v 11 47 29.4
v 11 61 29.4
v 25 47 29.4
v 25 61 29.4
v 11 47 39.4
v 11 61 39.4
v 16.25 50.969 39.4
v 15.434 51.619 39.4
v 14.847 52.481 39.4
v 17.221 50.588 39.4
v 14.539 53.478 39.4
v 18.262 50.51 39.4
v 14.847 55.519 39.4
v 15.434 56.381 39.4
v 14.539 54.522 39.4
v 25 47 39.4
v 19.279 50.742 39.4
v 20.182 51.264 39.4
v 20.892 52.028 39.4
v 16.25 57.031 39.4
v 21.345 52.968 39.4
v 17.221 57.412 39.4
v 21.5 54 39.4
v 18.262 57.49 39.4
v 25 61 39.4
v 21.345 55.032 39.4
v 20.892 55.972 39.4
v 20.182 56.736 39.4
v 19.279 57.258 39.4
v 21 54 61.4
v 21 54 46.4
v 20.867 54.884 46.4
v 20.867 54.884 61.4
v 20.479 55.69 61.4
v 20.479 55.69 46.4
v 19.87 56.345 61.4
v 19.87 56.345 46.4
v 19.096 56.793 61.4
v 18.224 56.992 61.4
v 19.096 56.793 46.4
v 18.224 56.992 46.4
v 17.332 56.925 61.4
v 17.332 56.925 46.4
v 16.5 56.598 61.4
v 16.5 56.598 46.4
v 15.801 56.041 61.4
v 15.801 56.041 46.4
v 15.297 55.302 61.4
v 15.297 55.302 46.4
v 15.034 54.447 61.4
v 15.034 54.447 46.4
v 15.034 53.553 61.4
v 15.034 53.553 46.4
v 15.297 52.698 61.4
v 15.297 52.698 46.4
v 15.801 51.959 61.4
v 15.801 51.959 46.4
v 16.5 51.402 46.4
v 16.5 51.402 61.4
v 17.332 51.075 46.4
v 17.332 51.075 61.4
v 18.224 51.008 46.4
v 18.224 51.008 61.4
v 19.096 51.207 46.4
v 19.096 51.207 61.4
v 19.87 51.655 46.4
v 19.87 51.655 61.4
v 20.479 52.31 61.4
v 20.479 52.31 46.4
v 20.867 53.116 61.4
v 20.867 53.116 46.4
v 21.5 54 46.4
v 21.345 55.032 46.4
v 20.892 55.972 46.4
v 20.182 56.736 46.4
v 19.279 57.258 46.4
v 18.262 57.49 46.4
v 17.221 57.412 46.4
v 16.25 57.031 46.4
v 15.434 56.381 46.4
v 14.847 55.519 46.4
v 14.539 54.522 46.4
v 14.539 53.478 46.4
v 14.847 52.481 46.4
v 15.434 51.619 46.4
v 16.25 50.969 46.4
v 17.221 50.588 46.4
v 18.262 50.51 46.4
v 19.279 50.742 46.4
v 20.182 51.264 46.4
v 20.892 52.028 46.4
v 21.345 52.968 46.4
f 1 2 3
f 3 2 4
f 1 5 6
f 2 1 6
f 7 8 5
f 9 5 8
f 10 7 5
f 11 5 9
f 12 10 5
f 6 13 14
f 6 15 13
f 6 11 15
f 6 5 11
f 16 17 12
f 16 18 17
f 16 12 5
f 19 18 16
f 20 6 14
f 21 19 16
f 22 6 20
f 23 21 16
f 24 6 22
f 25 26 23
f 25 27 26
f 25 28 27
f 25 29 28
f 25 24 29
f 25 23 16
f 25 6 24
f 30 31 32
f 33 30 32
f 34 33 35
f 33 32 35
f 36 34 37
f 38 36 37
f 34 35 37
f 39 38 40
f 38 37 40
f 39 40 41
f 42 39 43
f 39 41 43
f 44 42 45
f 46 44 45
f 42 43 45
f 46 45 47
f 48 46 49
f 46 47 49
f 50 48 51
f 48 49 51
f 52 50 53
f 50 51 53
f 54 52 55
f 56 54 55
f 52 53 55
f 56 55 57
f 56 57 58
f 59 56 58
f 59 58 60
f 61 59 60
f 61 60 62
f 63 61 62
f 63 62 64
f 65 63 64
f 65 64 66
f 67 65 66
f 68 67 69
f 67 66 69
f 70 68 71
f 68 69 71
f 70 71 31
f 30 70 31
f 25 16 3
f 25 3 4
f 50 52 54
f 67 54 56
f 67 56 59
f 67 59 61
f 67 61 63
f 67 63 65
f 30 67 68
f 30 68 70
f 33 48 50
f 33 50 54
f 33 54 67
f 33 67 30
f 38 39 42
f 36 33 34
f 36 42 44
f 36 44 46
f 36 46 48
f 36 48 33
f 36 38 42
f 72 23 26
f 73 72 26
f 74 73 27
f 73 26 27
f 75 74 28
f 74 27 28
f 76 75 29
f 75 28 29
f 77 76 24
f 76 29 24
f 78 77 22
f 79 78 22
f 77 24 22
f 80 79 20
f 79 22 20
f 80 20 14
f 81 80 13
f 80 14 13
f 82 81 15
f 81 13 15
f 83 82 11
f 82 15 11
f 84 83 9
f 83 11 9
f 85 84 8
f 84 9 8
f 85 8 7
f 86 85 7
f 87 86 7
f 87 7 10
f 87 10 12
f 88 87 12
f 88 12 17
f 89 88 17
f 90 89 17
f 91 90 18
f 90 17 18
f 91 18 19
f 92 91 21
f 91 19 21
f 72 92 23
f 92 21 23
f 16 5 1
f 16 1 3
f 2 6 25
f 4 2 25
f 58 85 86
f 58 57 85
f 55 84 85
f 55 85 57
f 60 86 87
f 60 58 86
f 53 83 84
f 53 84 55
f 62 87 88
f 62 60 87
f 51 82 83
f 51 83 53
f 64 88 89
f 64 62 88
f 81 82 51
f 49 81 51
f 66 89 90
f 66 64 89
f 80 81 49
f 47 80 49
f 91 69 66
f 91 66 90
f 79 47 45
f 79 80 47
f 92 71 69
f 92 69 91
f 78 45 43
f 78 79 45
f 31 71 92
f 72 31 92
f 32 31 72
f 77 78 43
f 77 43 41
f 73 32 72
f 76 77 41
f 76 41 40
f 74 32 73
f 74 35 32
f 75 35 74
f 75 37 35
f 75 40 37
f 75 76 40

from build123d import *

# Parameters (mm, degrees)
SKETCH029_W  = 14
SKETCH029_H  = 14
PAD014_DEPTH = 10
SKETCH030_R  = 3.5
PAD015_DEPTH = 7
SKETCH031_R  = 3
PAD016_DEPTH = 15


with BuildPart() as part:
    # Sketch029 → Pad014 (new body)
    with BuildSketch(Plane.XY):
        with Locations((7, 7)):
            Rectangle(SKETCH029_W, SKETCH029_H)
    extrude(amount=-PAD014_DEPTH)

    # Sketch030 → Pad015 (join)
    with BuildSketch(Plane.XY):
        with Locations((7, 7)):
            Circle(SKETCH030_R)
    extrude(amount=PAD015_DEPTH)

    # Sketch031 (on Face8 of Pad015) → Pad016 (join)
    with BuildSketch(Plane.XY.offset(7)):
        with Locations((7, 7)):
            Circle(SKETCH031_R)
    extrude(amount=PAD016_DEPTH)


with BuildPart() as part_1:
    # Body004 placement: moved
    add(part.part.moved(Location((11, 47, 39.4))))


solid = part_1.part
